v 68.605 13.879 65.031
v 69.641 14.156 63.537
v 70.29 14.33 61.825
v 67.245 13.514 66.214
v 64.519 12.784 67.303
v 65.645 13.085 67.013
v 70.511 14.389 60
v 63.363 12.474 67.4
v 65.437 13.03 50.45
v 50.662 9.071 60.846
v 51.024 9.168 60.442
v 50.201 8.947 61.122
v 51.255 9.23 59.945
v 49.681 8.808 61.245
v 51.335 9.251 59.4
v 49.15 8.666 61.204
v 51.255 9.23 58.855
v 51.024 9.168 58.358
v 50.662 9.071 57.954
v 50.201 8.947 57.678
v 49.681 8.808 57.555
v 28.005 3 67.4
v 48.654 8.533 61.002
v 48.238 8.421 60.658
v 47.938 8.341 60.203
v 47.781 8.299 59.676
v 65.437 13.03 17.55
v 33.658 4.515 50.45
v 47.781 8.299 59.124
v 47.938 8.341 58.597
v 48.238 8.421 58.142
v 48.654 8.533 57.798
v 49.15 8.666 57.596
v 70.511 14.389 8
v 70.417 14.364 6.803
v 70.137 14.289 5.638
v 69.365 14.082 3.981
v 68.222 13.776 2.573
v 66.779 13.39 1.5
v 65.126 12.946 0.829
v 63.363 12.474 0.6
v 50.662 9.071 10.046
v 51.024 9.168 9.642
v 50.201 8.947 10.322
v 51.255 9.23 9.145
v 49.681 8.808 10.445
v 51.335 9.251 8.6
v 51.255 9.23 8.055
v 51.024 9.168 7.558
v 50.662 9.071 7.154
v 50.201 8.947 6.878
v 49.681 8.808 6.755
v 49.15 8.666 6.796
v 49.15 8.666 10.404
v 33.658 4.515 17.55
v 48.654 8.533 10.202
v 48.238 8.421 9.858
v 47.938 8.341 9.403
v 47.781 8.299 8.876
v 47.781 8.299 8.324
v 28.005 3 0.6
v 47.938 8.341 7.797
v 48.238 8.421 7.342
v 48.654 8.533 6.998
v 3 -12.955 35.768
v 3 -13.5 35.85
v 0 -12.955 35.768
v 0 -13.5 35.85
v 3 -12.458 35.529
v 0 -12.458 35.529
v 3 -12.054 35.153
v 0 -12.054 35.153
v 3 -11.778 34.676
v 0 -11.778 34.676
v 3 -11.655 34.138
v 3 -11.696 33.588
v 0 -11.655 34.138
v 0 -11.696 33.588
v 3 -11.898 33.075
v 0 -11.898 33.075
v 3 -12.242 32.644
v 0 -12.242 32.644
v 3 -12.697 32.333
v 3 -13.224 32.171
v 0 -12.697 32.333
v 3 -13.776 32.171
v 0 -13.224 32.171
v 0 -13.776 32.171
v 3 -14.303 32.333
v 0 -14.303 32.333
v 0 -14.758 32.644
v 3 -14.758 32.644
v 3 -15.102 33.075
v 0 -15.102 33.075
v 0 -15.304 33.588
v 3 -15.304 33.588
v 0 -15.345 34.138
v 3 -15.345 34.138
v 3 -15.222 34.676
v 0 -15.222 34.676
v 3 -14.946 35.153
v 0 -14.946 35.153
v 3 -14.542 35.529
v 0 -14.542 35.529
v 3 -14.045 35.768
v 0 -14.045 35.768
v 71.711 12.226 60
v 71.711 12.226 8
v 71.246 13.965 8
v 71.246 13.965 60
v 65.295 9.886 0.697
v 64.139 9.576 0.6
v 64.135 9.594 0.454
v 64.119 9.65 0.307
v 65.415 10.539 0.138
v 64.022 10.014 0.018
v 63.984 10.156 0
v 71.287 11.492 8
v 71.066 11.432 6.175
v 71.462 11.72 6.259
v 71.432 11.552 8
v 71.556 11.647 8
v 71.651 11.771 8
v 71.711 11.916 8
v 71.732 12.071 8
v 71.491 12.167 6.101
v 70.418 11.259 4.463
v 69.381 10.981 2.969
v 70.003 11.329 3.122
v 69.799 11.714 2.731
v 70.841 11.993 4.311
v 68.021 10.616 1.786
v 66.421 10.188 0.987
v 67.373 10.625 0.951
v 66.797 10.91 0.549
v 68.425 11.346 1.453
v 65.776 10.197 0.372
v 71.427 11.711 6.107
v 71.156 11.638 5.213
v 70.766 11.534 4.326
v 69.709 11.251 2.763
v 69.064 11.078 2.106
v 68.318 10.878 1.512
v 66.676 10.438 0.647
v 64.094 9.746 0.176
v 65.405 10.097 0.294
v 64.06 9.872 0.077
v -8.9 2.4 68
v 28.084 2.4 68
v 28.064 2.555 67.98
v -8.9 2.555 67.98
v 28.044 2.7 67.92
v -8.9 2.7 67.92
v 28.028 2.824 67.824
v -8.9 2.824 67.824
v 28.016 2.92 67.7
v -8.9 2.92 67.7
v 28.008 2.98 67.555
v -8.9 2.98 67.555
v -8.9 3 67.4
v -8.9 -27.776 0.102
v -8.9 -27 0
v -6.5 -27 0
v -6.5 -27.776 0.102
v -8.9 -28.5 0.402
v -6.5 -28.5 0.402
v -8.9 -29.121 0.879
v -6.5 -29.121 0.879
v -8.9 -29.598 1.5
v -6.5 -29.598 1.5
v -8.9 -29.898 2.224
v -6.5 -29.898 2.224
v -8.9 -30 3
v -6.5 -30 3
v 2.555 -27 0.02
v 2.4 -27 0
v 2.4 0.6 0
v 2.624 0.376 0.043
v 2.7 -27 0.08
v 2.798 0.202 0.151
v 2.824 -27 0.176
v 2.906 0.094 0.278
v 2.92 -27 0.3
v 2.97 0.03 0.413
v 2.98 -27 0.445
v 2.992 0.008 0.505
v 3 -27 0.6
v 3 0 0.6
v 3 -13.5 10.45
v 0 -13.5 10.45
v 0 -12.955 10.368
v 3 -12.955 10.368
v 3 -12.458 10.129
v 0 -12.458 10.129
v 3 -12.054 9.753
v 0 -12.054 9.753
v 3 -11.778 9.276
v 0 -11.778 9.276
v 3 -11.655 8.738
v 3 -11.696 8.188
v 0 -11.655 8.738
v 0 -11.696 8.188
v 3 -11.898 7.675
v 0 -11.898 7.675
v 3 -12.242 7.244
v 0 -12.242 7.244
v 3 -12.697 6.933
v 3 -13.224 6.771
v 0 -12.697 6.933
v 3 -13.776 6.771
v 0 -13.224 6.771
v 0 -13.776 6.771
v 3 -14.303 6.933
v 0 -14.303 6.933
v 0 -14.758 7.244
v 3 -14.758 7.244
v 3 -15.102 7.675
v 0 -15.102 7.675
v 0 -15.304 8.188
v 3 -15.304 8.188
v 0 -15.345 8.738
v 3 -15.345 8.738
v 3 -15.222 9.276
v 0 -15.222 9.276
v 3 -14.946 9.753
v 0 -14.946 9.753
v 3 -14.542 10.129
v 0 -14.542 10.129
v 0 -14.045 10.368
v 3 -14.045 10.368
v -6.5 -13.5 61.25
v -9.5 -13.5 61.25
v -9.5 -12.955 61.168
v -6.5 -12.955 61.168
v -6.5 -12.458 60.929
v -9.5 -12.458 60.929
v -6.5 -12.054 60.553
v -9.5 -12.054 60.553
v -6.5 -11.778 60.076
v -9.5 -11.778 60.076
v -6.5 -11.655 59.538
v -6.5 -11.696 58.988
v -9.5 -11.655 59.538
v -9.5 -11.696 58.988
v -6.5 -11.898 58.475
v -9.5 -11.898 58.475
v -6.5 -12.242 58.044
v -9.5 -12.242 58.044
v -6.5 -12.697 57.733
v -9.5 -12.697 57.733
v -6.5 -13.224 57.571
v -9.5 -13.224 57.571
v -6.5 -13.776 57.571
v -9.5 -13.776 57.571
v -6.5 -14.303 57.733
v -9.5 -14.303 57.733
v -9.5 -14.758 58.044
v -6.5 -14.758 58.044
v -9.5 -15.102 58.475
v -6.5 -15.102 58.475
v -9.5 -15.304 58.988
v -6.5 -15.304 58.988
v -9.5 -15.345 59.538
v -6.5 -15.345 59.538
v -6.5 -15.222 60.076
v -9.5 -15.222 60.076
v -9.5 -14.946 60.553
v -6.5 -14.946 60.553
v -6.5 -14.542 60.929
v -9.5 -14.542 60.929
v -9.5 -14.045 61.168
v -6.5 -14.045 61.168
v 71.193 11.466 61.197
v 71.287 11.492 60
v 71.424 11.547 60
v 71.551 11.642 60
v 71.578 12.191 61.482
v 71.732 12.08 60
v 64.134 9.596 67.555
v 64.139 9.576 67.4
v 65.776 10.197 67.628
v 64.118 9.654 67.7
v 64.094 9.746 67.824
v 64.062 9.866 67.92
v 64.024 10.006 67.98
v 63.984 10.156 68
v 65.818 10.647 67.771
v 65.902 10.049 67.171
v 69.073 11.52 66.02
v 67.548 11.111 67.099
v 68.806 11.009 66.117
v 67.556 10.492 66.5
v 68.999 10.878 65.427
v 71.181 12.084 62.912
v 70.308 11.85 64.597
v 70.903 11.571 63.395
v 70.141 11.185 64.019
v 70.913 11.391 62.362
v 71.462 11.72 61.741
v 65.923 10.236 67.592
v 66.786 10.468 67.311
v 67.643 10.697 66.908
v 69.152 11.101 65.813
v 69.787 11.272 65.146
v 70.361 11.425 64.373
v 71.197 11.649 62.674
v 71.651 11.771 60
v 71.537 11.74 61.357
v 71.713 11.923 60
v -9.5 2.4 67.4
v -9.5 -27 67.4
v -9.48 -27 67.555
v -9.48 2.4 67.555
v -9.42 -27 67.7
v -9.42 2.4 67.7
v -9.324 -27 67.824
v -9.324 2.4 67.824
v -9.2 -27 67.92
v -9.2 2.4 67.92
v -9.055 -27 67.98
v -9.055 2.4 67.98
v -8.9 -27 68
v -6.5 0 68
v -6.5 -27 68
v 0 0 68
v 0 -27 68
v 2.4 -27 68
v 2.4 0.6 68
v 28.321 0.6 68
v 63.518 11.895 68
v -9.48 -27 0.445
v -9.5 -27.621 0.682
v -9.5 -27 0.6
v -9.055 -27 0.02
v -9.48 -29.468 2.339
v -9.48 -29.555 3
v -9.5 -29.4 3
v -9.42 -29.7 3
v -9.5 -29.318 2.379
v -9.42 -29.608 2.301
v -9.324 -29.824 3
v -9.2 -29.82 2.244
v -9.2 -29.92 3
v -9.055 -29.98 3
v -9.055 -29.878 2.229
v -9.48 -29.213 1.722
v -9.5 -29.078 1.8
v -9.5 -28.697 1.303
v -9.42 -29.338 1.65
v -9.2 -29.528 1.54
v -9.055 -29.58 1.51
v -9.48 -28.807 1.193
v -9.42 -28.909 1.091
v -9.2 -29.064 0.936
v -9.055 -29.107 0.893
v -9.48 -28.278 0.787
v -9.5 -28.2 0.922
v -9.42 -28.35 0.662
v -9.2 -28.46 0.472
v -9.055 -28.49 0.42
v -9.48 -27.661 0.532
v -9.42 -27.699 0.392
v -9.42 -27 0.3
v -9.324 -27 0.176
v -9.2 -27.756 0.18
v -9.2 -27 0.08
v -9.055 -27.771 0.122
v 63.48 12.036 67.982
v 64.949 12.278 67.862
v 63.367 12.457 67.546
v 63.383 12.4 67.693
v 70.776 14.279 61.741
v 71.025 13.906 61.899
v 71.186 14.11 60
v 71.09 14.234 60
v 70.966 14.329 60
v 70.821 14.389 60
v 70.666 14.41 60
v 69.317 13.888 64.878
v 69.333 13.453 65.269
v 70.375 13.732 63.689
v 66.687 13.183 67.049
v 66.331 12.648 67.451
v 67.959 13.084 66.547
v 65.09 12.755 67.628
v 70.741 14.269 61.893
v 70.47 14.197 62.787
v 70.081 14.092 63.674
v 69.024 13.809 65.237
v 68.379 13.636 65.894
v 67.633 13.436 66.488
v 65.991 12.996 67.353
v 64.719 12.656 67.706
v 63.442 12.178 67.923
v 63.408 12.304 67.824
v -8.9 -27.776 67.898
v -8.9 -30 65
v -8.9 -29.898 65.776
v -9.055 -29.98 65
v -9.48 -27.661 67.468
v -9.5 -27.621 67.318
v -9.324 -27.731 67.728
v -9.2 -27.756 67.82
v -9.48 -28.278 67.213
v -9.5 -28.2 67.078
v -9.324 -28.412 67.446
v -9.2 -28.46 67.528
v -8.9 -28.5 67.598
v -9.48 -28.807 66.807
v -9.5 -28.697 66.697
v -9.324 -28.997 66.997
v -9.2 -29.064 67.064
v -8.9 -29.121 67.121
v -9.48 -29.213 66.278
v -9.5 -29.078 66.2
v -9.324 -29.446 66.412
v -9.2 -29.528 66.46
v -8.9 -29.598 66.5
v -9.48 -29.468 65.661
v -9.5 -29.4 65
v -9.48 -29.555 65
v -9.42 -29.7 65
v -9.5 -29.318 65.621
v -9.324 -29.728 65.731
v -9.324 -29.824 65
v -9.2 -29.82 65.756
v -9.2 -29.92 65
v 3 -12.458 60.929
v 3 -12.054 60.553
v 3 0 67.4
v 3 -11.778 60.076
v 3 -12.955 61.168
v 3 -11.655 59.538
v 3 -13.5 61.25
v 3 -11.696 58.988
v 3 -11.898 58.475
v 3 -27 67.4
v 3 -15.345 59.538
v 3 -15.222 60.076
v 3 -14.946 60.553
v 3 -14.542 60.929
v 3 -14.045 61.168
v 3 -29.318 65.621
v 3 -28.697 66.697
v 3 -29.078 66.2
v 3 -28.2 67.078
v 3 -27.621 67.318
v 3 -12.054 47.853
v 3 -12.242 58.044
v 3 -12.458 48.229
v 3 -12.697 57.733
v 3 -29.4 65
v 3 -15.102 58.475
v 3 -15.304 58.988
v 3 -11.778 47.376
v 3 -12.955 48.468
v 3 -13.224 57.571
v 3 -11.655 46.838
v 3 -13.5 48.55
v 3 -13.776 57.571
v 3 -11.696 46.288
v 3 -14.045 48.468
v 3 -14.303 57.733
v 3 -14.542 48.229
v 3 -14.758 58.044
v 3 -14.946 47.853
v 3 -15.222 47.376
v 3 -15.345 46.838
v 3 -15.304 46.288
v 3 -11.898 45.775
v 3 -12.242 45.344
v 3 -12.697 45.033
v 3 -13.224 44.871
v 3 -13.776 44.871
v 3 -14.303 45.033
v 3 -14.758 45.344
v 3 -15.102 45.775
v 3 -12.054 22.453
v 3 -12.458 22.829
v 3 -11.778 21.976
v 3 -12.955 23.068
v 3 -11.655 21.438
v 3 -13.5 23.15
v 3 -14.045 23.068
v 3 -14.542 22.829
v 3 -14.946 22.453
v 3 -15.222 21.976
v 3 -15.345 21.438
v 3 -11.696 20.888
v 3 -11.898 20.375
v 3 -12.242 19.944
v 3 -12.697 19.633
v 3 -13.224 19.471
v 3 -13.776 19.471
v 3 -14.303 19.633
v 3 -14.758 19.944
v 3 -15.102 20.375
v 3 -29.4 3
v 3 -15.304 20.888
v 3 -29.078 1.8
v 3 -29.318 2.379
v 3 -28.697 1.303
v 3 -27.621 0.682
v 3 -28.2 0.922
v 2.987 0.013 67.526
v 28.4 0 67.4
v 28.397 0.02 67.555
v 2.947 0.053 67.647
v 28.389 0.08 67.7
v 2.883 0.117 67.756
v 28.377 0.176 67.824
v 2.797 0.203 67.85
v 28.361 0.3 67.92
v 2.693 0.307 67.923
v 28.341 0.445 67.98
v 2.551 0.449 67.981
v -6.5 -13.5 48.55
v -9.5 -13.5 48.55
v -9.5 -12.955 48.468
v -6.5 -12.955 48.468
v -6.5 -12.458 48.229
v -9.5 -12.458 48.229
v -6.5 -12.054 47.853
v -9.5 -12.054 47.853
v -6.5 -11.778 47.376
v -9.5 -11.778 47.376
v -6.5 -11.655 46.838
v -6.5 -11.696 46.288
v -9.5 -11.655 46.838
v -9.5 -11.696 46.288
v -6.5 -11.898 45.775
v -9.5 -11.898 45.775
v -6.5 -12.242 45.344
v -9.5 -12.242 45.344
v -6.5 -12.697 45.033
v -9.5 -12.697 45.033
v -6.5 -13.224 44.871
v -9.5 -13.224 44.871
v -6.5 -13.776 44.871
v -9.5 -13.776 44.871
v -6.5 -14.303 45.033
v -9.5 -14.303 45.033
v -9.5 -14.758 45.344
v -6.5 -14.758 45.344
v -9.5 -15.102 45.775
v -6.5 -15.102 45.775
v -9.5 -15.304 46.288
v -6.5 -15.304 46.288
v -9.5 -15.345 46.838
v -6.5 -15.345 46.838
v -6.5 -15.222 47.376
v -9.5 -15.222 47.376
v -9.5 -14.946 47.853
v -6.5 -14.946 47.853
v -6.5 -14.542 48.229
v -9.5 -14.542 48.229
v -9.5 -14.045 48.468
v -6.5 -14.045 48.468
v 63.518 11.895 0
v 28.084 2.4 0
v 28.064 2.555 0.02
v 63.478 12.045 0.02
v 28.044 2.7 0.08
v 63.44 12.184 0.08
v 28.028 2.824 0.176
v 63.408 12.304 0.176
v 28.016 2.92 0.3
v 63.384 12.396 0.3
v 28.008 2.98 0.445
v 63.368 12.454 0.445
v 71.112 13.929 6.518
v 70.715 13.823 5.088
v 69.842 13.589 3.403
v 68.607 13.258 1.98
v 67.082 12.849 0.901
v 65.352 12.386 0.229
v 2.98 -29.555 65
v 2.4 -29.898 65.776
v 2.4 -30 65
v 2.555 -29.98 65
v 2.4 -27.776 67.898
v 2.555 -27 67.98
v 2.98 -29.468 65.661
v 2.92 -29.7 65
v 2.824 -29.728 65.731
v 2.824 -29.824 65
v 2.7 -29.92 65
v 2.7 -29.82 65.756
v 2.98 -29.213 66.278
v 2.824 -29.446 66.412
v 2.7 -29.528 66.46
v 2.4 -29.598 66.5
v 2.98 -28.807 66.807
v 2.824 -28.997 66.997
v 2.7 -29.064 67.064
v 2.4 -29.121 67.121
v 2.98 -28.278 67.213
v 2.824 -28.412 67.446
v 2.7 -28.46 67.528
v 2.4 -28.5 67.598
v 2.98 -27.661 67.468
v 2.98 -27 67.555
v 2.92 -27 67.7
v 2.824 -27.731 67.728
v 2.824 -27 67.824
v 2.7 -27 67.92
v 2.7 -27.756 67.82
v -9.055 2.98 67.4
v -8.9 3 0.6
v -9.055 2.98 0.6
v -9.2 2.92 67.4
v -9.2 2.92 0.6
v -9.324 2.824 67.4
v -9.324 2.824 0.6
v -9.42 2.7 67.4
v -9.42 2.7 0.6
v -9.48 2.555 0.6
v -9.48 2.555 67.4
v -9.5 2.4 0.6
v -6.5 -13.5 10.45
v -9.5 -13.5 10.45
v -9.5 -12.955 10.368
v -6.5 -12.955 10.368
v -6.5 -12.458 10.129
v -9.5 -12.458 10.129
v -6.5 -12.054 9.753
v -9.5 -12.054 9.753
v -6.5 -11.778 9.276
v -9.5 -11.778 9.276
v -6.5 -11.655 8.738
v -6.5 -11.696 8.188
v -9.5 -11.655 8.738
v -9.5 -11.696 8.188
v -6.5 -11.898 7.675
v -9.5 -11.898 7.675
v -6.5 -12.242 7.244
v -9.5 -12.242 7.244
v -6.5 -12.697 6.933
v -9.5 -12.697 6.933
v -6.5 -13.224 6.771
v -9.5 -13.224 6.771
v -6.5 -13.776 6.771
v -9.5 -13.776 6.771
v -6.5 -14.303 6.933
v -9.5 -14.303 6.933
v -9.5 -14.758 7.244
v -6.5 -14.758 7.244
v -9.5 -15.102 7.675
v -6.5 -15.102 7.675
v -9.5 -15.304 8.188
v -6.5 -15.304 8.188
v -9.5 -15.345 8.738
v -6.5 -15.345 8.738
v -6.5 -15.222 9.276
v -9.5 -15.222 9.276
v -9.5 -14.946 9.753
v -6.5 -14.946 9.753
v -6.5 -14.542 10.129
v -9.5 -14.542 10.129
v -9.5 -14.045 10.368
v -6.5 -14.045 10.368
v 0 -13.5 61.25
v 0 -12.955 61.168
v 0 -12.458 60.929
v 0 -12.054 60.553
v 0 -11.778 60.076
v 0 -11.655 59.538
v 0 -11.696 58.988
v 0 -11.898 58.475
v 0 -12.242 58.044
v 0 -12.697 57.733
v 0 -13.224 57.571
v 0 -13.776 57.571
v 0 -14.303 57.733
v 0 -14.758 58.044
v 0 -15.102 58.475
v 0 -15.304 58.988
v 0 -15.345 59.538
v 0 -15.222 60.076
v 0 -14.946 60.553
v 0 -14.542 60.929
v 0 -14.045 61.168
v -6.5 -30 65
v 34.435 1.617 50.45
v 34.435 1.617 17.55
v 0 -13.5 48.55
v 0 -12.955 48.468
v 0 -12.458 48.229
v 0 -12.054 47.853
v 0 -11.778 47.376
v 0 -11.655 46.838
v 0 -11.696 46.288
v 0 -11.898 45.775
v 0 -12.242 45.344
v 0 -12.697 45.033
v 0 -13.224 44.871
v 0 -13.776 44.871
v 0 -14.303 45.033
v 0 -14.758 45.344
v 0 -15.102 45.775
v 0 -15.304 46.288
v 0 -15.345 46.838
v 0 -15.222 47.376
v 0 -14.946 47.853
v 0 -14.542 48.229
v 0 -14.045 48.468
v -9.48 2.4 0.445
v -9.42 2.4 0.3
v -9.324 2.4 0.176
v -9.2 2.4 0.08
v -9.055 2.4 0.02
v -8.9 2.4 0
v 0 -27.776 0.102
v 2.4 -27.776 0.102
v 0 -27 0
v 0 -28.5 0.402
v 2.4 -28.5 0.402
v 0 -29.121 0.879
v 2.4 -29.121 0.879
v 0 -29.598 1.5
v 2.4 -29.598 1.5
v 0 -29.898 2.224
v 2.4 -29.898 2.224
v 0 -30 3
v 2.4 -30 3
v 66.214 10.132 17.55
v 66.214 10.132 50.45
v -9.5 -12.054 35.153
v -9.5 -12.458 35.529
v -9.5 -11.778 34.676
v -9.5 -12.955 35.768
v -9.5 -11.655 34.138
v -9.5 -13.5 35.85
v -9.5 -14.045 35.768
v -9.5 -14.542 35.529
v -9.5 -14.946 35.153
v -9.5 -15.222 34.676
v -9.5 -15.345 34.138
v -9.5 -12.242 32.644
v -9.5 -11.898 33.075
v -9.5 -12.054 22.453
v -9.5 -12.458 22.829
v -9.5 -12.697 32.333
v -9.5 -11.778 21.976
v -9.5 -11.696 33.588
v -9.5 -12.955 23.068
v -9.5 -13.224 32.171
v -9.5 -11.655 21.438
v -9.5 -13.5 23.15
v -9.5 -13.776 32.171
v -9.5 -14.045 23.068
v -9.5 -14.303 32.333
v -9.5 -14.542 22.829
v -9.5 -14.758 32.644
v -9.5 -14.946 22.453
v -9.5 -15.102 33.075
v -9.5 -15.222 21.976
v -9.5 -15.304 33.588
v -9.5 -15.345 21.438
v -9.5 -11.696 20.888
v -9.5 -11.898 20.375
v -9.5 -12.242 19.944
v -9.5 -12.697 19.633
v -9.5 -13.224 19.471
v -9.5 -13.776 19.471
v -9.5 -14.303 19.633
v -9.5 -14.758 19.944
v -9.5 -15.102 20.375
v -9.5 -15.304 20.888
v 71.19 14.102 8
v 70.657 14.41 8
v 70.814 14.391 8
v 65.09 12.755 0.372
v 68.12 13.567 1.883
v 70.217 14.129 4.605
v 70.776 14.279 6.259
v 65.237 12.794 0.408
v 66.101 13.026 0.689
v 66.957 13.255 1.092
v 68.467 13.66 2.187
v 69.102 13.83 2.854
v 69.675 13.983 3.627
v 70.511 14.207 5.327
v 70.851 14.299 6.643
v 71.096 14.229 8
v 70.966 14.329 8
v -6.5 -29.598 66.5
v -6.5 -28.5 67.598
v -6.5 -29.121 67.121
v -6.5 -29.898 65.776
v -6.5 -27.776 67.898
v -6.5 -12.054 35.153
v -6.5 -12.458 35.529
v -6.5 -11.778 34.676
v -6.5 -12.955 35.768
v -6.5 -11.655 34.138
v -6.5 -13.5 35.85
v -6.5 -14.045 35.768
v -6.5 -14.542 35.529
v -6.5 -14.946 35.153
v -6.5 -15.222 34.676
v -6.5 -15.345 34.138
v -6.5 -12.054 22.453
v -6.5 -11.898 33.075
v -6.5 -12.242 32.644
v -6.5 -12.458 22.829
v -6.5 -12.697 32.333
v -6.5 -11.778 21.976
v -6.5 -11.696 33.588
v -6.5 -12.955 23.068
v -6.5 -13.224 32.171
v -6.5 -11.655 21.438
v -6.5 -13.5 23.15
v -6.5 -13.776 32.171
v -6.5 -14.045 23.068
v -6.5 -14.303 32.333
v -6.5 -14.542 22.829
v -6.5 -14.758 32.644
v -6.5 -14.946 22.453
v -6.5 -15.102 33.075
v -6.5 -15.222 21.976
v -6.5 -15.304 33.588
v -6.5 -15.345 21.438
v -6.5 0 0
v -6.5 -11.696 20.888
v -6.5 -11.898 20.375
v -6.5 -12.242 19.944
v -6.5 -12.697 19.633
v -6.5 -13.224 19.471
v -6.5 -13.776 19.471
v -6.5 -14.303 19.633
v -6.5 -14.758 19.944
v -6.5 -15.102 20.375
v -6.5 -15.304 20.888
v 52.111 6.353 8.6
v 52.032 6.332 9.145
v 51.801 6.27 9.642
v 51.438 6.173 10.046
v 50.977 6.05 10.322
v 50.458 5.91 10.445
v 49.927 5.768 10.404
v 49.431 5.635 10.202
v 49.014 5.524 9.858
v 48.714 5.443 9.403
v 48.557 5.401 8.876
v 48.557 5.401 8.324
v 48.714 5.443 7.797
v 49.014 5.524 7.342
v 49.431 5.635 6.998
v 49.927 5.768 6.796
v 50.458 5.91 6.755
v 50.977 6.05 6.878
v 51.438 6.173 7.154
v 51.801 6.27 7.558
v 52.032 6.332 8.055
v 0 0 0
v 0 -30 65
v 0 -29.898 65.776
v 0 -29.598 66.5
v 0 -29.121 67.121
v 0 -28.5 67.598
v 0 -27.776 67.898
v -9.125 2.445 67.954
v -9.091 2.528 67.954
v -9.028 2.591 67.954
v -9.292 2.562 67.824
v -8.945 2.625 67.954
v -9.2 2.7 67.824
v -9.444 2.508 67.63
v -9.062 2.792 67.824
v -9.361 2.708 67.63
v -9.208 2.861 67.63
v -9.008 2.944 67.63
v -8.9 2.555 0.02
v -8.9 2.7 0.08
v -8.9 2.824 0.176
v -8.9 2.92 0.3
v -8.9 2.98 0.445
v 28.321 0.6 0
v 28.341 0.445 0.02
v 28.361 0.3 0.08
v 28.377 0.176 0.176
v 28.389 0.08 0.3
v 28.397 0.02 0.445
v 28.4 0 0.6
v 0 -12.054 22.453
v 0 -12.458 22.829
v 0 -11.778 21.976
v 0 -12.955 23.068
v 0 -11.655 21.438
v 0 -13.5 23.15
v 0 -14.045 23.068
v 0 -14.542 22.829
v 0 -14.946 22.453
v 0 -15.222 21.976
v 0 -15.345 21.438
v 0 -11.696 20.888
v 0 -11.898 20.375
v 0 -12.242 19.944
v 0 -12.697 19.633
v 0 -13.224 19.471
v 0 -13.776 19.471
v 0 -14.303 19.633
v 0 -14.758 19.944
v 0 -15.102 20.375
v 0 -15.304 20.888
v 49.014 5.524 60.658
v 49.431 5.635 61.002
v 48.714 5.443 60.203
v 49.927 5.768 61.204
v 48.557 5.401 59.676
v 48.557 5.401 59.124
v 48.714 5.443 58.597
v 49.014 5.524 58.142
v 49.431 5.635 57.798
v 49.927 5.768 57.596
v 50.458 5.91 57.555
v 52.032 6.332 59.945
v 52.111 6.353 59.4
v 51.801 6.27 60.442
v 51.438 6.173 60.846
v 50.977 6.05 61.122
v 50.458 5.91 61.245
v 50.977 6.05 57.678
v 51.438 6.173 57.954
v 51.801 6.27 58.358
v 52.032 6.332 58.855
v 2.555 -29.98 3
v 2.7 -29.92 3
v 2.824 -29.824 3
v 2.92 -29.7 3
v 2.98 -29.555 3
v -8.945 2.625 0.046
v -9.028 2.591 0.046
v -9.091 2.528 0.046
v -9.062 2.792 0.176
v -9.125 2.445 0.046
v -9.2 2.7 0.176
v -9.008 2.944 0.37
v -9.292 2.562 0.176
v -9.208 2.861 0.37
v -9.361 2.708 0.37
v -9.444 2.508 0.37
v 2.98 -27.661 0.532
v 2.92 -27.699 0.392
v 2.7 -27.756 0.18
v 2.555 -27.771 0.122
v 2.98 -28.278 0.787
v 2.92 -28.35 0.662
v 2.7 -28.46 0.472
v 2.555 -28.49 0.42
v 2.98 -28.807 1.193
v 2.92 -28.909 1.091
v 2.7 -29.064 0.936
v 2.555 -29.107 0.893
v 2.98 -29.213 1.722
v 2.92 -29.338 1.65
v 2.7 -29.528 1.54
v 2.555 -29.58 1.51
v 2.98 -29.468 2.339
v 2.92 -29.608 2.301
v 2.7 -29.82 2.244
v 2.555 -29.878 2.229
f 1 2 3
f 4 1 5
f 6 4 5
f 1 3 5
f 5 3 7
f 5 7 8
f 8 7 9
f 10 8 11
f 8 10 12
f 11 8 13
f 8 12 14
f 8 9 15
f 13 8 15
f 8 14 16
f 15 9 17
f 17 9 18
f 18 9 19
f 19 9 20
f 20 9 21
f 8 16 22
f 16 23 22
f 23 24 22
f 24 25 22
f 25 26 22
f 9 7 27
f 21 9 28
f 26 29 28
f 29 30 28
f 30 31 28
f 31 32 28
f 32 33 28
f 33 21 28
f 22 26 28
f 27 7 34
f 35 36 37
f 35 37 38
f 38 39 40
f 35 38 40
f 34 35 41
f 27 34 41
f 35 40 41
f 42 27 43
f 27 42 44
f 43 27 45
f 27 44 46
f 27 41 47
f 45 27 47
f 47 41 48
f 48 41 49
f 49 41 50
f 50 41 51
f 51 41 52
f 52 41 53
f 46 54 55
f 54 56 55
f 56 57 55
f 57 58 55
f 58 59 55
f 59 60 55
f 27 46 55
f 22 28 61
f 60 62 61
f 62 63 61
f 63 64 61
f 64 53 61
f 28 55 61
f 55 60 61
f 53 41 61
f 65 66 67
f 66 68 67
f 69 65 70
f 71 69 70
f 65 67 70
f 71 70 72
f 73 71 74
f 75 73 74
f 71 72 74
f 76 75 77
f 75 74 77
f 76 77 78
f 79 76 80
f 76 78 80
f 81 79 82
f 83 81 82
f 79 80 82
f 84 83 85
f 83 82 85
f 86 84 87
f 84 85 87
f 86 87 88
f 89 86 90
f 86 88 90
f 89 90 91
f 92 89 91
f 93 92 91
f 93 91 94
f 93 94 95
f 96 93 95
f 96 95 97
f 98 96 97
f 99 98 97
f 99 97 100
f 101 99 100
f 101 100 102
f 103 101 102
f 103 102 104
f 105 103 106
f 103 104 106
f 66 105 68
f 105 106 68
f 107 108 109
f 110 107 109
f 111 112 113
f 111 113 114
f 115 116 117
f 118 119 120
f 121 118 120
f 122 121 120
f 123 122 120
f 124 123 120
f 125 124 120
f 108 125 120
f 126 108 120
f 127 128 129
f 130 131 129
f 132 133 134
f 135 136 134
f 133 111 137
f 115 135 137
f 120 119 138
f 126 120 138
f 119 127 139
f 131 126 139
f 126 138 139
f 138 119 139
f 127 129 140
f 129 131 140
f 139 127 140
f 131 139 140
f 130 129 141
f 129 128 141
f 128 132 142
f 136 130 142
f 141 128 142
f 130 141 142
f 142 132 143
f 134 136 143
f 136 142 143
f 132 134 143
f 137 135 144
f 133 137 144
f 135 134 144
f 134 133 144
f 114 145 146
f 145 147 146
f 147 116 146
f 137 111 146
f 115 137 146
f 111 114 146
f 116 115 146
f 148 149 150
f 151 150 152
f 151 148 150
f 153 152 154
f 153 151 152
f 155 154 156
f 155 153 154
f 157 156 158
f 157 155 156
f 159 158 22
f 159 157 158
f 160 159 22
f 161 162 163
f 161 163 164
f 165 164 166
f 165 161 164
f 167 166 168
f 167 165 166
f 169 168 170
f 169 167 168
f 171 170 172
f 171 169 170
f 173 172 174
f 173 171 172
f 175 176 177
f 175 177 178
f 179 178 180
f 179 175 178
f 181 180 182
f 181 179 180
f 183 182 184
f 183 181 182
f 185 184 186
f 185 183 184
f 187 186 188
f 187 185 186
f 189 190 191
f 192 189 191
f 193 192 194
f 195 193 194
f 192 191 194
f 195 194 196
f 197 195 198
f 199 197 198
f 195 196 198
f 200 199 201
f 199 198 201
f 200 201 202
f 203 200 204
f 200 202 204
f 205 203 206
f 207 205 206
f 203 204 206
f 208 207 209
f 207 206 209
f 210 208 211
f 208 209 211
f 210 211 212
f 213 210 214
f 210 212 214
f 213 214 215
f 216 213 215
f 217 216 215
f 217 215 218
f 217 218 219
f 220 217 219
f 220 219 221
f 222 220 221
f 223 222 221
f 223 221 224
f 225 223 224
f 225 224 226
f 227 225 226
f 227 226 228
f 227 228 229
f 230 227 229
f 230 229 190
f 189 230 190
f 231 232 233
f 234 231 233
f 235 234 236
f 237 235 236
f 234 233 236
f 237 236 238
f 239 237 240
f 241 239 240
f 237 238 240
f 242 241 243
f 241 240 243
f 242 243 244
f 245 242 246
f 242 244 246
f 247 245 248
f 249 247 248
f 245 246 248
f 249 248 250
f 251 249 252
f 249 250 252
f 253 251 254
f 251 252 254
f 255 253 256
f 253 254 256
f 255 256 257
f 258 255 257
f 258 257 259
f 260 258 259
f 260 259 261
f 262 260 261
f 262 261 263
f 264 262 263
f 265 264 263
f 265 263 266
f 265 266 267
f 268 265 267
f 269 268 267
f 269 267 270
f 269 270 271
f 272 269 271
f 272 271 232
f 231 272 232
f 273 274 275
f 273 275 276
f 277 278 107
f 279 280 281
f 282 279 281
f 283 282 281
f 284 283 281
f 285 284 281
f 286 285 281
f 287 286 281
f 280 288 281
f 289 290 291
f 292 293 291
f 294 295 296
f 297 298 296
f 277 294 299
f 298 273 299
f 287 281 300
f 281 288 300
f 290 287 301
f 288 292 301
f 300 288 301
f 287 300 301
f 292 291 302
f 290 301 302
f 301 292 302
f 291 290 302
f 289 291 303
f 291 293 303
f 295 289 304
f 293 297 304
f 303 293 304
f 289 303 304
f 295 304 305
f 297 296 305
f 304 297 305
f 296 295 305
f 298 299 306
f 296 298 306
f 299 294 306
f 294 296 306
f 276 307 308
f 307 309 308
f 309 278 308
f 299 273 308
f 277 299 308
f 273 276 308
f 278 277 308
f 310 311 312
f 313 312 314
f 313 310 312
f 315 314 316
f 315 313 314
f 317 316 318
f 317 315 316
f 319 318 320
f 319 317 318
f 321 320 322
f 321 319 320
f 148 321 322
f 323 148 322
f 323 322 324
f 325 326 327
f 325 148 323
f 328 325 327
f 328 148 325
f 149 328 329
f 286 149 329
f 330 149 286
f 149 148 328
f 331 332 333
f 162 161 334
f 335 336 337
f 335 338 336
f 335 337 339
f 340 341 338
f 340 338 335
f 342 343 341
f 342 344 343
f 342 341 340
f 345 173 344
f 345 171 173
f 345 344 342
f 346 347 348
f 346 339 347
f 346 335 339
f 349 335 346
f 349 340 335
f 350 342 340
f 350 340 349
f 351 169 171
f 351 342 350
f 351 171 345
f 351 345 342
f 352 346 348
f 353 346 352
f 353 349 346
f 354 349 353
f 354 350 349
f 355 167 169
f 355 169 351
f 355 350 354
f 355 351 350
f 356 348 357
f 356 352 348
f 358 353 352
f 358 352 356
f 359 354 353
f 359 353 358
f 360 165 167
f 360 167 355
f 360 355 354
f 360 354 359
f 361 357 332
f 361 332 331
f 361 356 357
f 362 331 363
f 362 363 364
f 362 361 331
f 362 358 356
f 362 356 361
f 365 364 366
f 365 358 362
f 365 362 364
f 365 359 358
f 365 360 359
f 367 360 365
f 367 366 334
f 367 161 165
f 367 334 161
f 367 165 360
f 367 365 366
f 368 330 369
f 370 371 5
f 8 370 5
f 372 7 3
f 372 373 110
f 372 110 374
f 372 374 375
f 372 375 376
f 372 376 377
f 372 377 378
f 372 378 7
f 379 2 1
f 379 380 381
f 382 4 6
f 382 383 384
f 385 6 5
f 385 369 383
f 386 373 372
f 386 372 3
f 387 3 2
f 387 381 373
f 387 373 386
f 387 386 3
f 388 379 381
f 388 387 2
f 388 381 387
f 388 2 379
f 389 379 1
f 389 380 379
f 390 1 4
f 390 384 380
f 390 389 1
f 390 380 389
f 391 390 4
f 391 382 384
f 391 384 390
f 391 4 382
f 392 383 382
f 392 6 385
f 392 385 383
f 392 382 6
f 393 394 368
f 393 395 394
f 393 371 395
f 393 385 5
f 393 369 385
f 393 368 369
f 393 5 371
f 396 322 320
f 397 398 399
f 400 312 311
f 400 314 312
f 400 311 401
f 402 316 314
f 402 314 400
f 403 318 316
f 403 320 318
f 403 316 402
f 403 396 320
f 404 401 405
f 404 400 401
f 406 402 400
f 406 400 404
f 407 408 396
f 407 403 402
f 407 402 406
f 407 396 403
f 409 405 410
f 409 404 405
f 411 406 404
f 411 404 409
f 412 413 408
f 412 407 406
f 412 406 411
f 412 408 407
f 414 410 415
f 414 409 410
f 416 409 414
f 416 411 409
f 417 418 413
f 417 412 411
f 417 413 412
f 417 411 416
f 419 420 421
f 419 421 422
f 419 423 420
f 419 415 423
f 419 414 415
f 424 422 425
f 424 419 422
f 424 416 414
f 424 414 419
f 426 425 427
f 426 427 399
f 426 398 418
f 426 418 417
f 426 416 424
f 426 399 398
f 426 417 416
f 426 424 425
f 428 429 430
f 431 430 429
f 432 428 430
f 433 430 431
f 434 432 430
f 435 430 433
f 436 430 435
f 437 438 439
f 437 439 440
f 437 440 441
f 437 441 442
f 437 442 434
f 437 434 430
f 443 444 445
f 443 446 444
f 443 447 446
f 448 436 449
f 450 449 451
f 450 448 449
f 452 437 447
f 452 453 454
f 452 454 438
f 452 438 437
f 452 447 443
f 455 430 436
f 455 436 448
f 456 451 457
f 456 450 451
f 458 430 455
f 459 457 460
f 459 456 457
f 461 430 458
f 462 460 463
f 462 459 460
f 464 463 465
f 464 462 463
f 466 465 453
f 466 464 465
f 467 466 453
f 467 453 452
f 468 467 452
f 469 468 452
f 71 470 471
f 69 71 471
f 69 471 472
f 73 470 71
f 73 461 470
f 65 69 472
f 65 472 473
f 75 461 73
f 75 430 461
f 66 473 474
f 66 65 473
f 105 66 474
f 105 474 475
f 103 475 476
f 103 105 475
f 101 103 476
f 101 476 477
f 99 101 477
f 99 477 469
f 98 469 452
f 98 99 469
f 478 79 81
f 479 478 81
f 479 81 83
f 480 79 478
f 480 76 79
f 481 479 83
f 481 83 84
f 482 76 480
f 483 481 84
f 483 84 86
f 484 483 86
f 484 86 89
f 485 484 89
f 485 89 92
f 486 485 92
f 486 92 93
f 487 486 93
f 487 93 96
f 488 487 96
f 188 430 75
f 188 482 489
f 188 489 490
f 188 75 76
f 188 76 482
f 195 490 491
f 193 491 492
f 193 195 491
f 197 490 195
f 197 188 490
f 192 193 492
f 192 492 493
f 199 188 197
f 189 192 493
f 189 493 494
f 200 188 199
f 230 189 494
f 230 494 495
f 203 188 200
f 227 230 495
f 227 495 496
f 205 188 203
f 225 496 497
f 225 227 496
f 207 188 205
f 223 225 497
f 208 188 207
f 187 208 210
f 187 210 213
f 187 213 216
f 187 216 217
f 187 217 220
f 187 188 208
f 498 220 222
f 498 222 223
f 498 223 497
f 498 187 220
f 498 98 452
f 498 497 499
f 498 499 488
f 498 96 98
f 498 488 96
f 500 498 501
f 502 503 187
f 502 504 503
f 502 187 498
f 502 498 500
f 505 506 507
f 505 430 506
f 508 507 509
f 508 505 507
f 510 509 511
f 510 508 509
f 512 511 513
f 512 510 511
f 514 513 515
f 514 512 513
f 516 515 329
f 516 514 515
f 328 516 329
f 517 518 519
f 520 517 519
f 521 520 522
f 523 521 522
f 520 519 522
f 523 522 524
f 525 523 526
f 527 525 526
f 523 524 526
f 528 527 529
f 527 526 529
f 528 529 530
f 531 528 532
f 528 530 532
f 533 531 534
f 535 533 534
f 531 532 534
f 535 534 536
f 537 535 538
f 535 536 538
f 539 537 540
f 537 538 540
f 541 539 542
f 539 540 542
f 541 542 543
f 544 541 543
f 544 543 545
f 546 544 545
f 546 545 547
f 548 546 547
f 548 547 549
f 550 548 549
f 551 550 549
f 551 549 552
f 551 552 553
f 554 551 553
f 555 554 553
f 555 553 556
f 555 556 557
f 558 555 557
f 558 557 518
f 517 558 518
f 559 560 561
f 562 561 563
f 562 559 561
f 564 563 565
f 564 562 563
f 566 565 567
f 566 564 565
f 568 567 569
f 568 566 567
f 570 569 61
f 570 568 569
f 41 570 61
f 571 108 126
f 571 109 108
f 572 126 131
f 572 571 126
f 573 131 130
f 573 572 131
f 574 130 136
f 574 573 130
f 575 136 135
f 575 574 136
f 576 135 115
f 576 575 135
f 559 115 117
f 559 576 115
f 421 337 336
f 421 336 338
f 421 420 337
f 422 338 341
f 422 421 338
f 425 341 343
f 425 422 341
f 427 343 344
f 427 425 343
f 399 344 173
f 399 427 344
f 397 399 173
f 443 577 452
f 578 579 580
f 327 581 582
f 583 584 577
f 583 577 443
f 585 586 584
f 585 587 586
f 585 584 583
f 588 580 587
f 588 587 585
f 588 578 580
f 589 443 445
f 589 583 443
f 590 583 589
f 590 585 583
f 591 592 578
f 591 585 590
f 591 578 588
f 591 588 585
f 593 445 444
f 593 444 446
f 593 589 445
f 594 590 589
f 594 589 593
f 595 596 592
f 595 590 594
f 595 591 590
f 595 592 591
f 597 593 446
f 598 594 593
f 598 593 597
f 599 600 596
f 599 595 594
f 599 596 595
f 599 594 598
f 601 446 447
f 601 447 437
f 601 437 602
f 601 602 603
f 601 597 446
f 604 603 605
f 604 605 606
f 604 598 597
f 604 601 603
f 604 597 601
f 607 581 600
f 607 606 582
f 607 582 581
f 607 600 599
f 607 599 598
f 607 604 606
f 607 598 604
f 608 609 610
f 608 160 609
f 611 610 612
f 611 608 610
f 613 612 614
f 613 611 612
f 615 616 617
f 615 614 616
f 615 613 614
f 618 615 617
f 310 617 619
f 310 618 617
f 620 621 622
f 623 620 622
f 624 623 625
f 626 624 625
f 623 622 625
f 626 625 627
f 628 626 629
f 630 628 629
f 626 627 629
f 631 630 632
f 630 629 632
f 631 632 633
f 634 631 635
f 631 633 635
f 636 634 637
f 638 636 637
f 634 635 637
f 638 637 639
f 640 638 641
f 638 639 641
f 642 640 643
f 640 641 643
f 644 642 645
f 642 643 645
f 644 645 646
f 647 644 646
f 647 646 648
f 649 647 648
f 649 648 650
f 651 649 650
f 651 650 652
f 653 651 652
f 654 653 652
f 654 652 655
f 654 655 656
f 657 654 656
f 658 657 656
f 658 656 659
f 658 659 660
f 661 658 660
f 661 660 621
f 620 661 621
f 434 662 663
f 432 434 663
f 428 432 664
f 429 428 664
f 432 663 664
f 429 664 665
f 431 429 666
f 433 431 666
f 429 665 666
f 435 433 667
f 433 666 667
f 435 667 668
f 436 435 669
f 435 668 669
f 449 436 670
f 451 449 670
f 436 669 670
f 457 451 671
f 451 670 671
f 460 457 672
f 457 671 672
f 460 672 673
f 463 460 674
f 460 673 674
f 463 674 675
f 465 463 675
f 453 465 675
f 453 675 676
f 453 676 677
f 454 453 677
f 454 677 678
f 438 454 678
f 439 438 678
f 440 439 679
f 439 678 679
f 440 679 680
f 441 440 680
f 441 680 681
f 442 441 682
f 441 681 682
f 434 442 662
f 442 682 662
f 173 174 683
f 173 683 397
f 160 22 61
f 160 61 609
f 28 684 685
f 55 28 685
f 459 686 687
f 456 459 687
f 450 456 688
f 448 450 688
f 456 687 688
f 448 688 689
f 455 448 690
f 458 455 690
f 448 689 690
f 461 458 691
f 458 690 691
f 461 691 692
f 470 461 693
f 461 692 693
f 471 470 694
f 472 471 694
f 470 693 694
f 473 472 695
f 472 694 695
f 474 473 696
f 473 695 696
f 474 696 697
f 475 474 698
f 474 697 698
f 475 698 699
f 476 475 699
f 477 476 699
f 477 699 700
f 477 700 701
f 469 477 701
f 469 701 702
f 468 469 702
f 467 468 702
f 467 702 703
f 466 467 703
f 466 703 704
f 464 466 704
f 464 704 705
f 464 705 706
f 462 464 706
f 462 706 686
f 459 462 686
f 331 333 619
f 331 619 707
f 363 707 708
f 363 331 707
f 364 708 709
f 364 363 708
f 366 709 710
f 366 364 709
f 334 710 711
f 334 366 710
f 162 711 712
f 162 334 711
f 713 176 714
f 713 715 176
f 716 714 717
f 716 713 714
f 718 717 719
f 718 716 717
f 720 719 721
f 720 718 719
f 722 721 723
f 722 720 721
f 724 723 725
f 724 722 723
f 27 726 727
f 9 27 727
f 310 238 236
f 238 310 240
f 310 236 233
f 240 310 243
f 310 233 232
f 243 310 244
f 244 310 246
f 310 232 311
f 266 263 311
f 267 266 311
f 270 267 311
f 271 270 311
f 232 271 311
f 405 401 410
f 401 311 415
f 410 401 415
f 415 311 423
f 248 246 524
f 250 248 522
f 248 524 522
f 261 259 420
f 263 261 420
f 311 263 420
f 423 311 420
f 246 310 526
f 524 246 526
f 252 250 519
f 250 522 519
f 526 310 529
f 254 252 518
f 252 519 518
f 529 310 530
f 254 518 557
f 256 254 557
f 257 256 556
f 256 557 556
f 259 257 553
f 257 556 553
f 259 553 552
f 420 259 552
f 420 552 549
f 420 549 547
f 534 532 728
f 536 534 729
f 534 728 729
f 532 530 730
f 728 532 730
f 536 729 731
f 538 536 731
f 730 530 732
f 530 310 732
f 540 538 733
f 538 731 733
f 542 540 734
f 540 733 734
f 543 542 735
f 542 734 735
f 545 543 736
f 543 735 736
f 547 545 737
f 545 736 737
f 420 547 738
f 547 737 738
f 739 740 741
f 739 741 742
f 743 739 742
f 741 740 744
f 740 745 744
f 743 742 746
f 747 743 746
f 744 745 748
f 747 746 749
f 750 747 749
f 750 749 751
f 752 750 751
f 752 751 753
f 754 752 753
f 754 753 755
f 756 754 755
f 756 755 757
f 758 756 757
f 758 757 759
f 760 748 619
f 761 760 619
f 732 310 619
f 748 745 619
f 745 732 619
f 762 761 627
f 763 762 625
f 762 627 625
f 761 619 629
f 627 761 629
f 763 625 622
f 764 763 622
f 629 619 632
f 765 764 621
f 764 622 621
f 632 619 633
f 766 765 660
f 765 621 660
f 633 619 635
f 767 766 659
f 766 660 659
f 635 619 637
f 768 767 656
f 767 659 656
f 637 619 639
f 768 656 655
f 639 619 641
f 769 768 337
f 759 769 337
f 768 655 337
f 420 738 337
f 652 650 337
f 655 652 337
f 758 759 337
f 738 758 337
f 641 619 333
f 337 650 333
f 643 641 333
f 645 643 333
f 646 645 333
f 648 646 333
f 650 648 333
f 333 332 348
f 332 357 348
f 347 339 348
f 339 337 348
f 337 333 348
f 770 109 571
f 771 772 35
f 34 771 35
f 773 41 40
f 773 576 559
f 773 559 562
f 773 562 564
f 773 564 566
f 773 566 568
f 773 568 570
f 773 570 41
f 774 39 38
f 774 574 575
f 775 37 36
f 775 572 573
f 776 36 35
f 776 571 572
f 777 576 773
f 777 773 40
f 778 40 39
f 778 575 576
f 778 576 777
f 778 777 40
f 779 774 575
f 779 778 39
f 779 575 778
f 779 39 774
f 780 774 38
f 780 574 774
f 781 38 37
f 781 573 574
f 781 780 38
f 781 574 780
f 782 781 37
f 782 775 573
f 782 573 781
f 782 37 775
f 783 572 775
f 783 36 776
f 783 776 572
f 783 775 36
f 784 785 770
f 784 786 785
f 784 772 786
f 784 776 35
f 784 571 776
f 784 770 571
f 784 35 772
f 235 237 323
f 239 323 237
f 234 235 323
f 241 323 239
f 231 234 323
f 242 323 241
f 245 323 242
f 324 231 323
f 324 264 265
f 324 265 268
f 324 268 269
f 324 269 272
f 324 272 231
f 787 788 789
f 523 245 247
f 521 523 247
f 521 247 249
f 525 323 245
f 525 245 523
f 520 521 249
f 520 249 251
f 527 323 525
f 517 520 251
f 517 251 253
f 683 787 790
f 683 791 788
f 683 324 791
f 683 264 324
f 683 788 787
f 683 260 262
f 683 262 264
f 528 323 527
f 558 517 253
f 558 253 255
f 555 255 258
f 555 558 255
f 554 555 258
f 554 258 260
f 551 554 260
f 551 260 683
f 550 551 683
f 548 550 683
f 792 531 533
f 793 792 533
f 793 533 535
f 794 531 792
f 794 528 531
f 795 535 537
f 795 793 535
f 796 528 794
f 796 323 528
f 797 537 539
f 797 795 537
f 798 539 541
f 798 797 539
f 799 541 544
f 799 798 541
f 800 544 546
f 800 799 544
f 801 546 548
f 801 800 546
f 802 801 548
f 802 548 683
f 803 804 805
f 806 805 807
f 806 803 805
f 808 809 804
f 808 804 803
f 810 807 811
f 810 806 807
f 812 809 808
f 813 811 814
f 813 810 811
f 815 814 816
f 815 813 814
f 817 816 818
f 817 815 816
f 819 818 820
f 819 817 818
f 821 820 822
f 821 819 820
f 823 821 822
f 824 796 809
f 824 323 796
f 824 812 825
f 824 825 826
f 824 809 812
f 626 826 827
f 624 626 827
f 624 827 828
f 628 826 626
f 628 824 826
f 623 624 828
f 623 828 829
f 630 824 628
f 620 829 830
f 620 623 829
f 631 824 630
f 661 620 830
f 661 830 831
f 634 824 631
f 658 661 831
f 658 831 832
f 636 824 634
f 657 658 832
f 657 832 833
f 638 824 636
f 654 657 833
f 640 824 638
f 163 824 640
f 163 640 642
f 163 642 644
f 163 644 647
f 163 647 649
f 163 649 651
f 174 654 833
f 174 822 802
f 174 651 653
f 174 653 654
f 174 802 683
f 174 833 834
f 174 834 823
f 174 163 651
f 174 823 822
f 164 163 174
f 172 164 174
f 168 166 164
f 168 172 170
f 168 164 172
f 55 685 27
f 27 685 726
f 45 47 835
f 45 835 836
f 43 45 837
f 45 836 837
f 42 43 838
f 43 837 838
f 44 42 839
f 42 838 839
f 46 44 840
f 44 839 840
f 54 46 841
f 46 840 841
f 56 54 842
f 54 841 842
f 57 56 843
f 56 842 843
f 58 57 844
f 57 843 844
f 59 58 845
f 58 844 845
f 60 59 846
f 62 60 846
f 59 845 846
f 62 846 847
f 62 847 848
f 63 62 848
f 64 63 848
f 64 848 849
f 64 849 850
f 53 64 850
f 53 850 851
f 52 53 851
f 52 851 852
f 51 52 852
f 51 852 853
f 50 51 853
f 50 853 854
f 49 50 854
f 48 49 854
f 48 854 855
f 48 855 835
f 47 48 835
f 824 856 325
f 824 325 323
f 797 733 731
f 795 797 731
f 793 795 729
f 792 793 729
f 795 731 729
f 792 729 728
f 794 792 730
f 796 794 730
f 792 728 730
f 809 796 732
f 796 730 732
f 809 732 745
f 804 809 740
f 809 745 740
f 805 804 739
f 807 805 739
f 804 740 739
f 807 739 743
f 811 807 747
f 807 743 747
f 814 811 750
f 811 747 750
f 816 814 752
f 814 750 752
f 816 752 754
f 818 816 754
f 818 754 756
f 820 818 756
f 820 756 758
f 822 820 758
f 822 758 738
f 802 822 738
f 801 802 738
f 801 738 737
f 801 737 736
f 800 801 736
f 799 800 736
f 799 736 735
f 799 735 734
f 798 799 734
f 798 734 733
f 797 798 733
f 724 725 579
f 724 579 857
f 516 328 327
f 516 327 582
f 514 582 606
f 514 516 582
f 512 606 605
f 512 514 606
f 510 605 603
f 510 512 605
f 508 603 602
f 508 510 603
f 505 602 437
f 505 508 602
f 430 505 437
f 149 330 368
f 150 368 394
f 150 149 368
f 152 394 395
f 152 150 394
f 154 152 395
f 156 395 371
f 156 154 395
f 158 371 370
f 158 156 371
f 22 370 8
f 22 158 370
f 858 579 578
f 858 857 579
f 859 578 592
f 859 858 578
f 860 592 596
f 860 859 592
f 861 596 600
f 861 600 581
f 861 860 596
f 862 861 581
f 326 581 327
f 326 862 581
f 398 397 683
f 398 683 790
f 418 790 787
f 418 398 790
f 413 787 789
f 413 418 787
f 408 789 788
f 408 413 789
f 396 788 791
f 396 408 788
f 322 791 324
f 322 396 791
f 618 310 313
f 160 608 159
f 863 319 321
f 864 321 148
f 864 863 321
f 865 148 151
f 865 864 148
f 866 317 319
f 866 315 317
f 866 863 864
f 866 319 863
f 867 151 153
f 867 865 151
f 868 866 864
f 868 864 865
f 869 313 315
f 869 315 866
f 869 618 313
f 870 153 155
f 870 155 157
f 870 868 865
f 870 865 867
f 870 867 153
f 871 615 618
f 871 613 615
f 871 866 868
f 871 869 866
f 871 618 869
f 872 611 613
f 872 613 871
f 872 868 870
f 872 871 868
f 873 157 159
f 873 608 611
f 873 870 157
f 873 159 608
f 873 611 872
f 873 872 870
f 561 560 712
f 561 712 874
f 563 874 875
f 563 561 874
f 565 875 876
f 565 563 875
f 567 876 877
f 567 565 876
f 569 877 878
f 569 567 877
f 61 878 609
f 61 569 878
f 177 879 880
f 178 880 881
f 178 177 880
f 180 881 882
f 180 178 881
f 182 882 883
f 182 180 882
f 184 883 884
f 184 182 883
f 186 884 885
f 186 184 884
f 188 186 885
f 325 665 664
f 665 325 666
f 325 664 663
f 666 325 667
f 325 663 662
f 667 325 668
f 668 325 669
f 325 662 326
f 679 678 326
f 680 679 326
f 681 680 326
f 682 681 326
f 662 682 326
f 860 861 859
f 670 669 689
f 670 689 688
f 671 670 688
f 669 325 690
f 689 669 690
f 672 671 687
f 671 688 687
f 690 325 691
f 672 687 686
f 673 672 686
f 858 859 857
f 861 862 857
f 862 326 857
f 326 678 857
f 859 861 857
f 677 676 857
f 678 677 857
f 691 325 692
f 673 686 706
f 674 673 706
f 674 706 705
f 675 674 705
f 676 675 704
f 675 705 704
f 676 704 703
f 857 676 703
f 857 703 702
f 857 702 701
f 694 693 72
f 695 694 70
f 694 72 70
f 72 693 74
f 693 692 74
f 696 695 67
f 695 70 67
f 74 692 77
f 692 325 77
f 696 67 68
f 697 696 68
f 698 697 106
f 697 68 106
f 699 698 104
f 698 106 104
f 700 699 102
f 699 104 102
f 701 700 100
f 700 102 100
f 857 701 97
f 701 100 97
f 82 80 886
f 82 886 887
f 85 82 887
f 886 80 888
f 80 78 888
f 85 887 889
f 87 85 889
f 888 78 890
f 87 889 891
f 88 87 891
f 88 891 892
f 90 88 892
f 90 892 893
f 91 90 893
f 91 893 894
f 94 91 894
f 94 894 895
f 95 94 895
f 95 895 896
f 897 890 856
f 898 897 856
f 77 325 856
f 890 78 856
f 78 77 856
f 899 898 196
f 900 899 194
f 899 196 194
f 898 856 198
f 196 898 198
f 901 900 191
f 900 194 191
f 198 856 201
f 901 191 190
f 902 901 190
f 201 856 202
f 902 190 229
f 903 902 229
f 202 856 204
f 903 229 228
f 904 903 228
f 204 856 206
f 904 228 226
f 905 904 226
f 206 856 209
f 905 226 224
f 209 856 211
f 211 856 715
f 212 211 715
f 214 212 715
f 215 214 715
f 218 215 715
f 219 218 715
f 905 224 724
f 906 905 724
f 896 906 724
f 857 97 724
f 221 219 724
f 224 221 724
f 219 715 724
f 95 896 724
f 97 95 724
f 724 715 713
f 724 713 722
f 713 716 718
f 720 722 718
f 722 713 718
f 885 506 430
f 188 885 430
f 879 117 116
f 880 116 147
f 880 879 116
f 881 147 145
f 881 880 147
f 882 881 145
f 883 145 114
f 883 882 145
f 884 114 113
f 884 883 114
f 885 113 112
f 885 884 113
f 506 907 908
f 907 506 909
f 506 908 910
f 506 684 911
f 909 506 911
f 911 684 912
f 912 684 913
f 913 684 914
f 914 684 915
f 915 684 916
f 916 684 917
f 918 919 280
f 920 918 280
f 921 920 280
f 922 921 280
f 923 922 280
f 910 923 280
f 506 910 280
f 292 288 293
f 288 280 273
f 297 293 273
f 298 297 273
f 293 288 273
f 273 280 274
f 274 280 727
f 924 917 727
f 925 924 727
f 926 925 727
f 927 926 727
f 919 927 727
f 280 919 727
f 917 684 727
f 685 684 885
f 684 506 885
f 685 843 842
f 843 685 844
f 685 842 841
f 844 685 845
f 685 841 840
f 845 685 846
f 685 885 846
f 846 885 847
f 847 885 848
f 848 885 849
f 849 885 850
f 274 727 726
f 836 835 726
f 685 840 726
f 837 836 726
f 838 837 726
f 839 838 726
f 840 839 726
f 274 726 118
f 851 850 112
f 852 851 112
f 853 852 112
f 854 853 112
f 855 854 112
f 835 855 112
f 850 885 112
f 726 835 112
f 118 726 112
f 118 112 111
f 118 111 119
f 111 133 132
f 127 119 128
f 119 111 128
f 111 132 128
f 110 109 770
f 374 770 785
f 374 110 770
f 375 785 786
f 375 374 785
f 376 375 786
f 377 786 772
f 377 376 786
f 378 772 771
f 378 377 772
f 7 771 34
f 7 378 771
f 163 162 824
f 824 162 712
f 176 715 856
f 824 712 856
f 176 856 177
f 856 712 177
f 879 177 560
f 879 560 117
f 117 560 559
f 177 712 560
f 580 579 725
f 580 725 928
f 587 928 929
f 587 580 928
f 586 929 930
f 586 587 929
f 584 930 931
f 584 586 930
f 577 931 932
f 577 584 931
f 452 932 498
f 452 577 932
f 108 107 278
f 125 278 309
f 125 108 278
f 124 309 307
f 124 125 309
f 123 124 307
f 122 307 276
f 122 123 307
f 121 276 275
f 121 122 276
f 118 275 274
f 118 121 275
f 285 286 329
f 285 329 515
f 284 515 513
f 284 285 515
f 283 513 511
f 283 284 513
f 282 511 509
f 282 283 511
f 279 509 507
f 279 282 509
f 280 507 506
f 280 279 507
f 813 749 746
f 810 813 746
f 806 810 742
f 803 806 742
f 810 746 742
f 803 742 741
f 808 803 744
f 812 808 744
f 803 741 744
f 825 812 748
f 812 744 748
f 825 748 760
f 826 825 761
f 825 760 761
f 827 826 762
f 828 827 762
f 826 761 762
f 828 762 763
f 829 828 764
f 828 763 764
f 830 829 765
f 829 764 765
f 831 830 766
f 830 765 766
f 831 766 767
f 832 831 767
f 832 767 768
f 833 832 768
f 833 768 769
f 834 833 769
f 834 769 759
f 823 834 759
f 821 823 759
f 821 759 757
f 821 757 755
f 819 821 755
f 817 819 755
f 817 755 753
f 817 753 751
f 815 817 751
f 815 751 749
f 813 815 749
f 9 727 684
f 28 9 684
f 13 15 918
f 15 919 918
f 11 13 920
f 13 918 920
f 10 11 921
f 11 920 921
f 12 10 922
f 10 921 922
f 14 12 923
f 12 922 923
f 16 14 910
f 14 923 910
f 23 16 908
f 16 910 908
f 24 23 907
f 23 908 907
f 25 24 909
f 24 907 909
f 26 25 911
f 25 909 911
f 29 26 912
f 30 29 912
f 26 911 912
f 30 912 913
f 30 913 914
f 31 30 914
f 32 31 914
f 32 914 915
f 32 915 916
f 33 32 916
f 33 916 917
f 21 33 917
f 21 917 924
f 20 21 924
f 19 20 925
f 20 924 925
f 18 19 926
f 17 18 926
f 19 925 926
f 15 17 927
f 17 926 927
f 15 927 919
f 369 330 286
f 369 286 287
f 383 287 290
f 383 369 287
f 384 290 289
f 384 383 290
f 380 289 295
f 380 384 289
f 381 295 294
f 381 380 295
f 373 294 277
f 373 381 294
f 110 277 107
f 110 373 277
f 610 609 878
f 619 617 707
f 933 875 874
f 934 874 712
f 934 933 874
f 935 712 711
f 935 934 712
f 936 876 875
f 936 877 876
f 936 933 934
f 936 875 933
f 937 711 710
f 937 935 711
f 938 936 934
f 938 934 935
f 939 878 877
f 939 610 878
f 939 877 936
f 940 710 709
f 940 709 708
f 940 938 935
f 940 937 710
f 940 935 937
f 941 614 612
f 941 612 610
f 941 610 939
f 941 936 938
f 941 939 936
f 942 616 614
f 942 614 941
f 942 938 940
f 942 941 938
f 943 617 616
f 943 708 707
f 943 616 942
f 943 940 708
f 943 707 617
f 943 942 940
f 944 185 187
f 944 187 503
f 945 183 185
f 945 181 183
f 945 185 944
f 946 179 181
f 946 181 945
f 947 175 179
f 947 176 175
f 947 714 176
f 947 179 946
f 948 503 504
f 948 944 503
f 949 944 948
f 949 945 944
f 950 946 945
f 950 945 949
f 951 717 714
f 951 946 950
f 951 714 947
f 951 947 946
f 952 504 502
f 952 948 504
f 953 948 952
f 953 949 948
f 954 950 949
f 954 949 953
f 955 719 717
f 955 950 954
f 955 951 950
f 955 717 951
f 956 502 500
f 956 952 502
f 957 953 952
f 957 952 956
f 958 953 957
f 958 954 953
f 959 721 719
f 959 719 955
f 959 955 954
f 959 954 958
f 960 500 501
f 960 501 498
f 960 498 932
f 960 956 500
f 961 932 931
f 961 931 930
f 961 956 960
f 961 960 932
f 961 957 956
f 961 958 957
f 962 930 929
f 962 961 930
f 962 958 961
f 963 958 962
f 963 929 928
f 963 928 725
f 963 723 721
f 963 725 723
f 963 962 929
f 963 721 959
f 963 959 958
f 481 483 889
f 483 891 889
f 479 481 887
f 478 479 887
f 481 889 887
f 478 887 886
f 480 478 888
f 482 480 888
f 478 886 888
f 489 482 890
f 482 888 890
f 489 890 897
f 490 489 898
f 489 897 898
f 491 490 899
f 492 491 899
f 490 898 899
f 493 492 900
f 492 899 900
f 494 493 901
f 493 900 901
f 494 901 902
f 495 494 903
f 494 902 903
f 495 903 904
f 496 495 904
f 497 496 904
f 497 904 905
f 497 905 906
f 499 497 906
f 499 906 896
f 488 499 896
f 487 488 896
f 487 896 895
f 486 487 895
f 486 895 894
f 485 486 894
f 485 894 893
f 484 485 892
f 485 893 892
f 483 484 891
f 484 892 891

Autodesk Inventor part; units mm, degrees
ref_plane "YZ Plane" through (0, 0, 0) normal (1, 0, 0) x (0, 1, 0)
ref_plane "XZ Plane" through (0, 0, 0) normal (0, 1, 0) x (-1, 0, 0)
ref_plane "XY Plane" through (0, 0, 0) normal (0, 0, 1) x (1, 0, 0)
sketch "Sketch1" plane through (0, 0, 0) normal (0, 0, 1) x (1, 0, 0)
  line L0 (0, 0) -> (-6.5, 0)
  line L1 (-6.5, 0) -> (-6.5, -30)
  line L2 (-6.5, 0) -> (23.5, 0) construction
  line L3 (0, 0) -> (0, -30)
  line L4 (3, 0) -> (3, -30)
  line L5 (0, 3) -> (-9.5, 3)
  line L6 (-9.5, 3) -> (-9.5, -30)
  line L7 (3, -30) -> (0, -30)
  line L8 (-6.5, -30) -> (-9.5, -30)
  line L9 (28.4, 0) -> (71.8667, 11.6469)
  line L10 (28.4, 0) -> (73.4, 0) construction
  line L11 (28.4, 0) -> (3, 0)
  line L12 (0, 3) -> (28.005, 3)
  line L13 (71.0902, 14.5446) -> (28.005, 3)
  line L14 (71.8667, 11.6469) -> (71.0902, 14.5446)
  dimension "d0" = 6.5
  dimension "d1" = 30
  dimension "d2" = 90
  dimension "d3" = 30
  dimension "d4" = 3
  dimension "d5" = 3
  dimension "d6" = 25.4
  dimension "d7" = 45
  dimension "d8" = 15
extrude "Extrusion1" add sketch "Sketch1" along normal blind 68
sketch "Sketch2" plane through (71.8667, 11.6469, 0) normal (0.2588, -0.9659, 0) x (0.9659, 0.2588, 0)
  line L0 (0, 0) -> (-44.605, 0) construction
  line L1 (-22.3025, 0) -> (-22.3025, 68) construction
  line L2 (0, 68) -> (-44.605, 68) construction
  circle A0 centre (-22.3025, 34) radius 25.4 construction
  circle A1 centre (-22.3025, 8.6) radius 1.85
  circle A2 centre (-22.3025, 59.4) radius 1.85
  line L3 (-5.8525, 50.45) -> (-38.7525, 50.45)
  line L4 (-38.7525, 50.45) -> (-38.7525, 17.55)
  line L5 (-38.7525, 17.55) -> (-5.8525, 17.55)
  line L6 (-5.8525, 17.55) -> (-5.8525, 50.45)
  line L7 (-5.8525, 50.45) -> (-38.7525, 17.55) construction
  line L8 (-38.7525, 50.45) -> (-5.8525, 17.55) construction
  point P0 (-72.4323, 0)
  dimension "d12" = 50.8
  dimension "d13" = 3.7
  dimension "d14" = 3.7
  dimension "d15" = 32.9
  dimension "d16" = 32.9
extrude "Extrusion2" cut sketch "Sketch2" against normal blind 68
sketch "Sketch3" plane through (-9.5, -30, 0) normal (-1, 0, 0) x (0, 0, 1)
  line L0 (0, 33) -> (0, 0) construction
  line L1 (0, 16.5) -> (68, 16.5) construction
  line L2 (68, 33) -> (68, 0) construction
  circle A0 centre (34, 16.5) radius 1.85
  circle A1 centre (46.7, 16.5) radius 1.85
  circle A2 centre (21.3, 16.5) radius 1.85
  circle A3 centre (59.4, 16.5) radius 1.85
  circle A4 centre (8.6, 16.5) radius 1.85
  point P0 (0, 30)
  dimension "d19" = 3.7
  dimension "d22" = 12.7
extrude "Extrusion3" cut sketch "Sketch3" against normal blind 68
fillet "Fillet1" radius 8 2 edges at (71.4784, 13.0957, 0) (71.4784, 13.0957, 68)
fillet "Fillet2" radius 3 4 edges at (1.5, -30, 68) (-8, -30, 68) (1.5, -30, 0) (-8, -30, 0)
fillet "Fillet3" radius 0.6 25 edges at (-9.5, 3, 34) (-9.5, -29.1213, 67.1213) (-9.5, -30, 34) (-9.5, -29.1213, 0.8787) (-9.5, -12, 0) (-9.5, -12, 68) (9.2525, 3, 68) (9.2525, 3, 0) (68.8269, 13.9382, 2.3431) (71.0902, 14.5446, 34) (68.8269, 13.9382, 65.6569) (45.6839, 7.737, 68) (45.6839, 7.737, 0) (69.6034, 11.0404, 65.6569) (71.8667, 11.6469, 34) (69.6034, 11.0404, 2.3431) (46.2696, 4.7882, 0) (46.2696, 4.7882, 68) (15.7, 0, 68) (15.7, 0, 0) (3, -29.1213, 67.1213) (3, -13.5, 68) (3, -29.1213, 0.8787) (3, -13.5, 0) (3, -30, 34)
chamfer "Chamfer1" [suppressed]
properties part number "CamMountThrify"
